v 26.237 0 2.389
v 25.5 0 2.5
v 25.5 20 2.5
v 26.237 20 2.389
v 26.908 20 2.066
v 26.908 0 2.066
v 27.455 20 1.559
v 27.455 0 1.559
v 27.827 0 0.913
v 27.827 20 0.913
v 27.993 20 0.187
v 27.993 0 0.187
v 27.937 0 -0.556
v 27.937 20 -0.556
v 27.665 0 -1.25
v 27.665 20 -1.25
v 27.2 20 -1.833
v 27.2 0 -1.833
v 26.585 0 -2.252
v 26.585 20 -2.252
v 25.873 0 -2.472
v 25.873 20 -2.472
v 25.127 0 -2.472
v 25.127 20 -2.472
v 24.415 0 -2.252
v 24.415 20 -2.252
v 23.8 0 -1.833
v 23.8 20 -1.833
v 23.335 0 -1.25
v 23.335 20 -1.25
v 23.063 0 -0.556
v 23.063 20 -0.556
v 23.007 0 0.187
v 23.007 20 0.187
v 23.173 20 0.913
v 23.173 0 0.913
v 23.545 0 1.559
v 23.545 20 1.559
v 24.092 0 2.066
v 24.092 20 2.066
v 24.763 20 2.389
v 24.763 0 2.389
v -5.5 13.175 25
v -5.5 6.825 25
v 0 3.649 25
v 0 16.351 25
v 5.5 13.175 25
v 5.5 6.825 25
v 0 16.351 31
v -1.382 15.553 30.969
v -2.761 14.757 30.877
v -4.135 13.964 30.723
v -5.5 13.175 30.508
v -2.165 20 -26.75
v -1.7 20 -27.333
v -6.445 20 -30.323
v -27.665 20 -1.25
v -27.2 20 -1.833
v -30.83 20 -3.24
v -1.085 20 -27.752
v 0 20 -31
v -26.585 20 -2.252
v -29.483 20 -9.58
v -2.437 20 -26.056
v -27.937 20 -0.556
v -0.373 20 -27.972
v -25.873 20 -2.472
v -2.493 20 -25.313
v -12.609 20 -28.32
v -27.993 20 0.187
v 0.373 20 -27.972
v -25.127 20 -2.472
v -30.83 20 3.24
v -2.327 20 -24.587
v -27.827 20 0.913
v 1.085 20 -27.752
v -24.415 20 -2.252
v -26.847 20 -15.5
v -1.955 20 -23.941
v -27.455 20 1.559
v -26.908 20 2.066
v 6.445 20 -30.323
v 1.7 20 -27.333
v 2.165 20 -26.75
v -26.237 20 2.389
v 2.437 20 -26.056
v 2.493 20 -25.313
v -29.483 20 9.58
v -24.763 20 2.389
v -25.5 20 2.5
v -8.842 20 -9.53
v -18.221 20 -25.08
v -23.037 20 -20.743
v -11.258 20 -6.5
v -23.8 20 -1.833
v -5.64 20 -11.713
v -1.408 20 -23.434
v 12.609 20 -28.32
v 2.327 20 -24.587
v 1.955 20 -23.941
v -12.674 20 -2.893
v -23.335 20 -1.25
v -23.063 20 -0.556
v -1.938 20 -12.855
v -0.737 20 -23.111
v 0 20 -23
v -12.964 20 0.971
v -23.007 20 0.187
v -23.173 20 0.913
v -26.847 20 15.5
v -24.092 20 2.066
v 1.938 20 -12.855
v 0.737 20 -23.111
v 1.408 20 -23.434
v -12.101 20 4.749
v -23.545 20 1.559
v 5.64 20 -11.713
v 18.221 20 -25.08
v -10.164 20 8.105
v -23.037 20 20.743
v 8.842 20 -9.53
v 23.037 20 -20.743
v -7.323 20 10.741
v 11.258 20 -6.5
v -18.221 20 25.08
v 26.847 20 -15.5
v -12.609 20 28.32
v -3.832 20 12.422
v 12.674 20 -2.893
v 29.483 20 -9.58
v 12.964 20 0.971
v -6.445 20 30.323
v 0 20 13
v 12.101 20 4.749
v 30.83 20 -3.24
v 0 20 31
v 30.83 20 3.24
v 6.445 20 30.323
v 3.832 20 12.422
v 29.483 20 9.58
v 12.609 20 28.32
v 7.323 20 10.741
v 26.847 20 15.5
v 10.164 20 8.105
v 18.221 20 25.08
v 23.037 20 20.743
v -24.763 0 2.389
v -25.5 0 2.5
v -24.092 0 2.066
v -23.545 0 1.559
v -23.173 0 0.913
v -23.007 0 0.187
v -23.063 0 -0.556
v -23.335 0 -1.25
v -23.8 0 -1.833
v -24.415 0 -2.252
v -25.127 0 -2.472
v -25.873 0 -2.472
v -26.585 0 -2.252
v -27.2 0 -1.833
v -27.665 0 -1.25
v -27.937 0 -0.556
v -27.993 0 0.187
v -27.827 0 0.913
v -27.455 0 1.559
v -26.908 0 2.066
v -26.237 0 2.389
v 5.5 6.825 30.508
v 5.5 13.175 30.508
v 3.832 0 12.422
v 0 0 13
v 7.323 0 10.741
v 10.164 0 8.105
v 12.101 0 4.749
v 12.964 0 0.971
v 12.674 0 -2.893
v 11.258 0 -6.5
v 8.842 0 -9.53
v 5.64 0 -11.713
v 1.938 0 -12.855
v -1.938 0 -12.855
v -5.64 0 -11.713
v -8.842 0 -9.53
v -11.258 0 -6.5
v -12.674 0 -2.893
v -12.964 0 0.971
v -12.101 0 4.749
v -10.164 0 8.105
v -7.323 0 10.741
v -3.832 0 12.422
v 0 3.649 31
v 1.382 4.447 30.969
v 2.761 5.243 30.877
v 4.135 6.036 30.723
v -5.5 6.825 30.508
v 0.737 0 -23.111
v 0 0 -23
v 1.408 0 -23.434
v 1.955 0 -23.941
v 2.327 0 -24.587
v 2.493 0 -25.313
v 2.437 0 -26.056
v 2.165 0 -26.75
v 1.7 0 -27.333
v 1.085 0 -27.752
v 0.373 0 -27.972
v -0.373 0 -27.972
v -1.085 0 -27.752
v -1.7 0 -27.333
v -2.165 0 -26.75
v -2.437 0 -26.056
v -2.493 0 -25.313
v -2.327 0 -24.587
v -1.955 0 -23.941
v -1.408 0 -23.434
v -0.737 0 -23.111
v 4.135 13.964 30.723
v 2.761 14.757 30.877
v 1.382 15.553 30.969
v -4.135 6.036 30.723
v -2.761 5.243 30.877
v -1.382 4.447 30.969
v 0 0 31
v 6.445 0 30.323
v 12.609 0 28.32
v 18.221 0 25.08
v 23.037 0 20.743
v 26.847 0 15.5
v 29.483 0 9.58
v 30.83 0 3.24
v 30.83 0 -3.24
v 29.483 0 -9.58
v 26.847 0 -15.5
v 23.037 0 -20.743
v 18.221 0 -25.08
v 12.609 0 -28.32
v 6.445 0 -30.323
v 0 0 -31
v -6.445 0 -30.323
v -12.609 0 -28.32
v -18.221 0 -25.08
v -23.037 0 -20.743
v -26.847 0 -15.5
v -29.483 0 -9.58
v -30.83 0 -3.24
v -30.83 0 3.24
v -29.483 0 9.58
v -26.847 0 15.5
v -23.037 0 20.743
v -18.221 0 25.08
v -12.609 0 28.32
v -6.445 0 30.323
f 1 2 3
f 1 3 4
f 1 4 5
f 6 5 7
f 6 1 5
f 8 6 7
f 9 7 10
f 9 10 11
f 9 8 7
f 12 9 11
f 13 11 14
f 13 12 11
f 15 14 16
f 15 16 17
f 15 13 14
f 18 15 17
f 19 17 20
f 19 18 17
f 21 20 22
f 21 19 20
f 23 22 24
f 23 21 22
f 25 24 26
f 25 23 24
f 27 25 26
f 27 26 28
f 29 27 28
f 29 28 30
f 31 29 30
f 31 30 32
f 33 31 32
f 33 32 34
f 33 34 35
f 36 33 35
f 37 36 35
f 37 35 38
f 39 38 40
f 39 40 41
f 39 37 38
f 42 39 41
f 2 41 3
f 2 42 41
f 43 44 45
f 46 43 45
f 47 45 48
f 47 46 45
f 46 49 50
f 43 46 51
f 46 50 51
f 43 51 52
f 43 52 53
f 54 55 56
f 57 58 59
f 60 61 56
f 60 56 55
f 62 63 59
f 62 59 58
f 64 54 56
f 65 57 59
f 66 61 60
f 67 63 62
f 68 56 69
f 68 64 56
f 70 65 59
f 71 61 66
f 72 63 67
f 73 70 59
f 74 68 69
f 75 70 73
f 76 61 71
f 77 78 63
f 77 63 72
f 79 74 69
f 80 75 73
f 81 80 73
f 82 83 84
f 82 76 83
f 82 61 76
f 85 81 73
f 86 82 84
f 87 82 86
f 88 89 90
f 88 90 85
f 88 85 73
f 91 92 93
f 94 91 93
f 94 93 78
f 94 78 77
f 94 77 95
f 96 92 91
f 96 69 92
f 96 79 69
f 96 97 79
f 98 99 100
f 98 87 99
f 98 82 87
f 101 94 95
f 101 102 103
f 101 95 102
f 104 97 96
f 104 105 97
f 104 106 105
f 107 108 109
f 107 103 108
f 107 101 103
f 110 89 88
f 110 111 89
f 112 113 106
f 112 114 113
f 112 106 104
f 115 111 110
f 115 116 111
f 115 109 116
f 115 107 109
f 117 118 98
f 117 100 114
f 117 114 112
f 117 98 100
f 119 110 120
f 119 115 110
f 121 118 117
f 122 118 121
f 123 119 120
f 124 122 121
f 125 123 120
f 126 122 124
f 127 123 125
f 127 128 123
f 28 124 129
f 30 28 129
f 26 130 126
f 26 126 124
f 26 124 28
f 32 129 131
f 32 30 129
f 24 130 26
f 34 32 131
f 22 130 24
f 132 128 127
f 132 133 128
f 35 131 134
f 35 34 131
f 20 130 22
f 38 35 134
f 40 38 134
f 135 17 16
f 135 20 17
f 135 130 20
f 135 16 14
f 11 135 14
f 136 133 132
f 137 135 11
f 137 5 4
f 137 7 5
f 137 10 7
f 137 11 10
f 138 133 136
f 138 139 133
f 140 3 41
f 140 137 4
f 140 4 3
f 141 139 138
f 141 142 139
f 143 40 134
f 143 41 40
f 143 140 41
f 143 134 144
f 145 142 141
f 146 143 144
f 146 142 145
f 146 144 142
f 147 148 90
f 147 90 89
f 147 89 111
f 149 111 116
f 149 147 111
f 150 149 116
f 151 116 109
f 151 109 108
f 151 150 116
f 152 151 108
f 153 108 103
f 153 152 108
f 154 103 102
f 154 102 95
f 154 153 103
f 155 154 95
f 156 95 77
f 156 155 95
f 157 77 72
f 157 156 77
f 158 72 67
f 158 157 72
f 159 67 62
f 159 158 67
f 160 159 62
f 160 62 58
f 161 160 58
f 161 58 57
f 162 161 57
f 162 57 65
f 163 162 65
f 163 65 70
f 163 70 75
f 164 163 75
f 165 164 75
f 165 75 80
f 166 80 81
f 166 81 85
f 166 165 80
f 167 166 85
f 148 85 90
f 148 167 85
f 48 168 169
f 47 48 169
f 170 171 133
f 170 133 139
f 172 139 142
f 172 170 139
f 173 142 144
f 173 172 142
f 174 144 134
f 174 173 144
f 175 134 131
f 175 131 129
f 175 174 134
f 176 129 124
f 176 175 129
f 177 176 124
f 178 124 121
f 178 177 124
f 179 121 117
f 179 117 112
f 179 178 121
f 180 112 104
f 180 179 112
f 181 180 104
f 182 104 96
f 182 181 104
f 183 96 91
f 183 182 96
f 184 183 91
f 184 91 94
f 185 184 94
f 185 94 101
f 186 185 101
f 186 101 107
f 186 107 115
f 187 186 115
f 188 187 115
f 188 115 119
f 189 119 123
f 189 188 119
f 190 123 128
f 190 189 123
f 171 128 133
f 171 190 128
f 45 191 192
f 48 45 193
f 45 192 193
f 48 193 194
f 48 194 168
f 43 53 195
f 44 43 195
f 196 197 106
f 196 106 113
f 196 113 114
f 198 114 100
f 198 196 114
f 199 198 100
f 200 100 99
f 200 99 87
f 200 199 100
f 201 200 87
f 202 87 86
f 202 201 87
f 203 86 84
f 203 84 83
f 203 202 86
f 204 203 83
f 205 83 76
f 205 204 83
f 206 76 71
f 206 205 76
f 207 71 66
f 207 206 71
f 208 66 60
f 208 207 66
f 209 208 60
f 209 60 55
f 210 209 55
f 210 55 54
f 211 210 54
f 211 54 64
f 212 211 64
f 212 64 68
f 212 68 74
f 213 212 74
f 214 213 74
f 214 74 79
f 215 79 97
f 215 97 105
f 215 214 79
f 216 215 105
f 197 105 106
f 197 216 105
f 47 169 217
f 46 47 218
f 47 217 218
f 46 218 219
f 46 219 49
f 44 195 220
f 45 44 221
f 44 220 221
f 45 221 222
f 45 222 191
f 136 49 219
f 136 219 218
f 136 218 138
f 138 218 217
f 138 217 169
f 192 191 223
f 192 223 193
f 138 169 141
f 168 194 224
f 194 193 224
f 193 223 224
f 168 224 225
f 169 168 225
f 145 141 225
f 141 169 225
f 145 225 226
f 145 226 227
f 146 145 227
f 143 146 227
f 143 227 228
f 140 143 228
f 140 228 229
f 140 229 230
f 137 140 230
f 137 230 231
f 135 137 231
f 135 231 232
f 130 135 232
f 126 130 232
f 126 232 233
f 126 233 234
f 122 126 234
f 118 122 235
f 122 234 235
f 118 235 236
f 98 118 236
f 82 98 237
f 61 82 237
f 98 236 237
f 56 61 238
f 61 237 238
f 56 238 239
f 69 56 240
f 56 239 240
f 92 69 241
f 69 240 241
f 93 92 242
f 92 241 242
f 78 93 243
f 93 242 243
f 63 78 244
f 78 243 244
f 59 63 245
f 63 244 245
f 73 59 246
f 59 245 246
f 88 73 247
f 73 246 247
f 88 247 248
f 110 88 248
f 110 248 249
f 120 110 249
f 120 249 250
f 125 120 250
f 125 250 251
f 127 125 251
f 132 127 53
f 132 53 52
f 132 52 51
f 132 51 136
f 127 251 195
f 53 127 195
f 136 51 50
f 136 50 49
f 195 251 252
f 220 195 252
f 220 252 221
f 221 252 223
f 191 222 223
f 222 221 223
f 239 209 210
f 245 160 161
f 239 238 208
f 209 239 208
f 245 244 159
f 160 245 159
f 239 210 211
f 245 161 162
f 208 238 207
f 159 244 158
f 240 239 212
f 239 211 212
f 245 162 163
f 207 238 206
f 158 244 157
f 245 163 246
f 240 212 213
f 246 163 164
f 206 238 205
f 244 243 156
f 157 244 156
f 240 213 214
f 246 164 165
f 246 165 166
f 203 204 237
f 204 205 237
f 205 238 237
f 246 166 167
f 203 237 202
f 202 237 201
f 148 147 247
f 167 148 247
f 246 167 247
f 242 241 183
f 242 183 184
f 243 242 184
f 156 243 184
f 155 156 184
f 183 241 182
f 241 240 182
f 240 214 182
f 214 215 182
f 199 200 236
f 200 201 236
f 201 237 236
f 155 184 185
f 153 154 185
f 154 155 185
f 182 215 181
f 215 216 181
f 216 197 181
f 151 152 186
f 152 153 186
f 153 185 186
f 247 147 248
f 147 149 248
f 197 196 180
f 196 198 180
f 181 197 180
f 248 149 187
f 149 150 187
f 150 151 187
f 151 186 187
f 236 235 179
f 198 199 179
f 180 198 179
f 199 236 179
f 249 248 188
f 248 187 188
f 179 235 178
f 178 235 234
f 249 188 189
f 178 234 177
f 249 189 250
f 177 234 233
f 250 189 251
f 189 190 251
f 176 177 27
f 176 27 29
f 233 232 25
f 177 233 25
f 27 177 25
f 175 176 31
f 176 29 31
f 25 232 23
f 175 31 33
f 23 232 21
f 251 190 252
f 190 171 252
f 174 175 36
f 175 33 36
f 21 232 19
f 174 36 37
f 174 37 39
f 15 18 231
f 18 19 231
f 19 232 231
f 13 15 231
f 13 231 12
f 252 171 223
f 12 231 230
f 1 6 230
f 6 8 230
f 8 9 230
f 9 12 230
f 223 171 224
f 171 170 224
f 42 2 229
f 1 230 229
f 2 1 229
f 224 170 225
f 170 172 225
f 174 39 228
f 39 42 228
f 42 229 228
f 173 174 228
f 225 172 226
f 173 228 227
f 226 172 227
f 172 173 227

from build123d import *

# Parameters (mm, degrees)
SKETCH1_R           = 31
SKETCH1_R_2         = 13
SKETCH1_R_3         = 2.5
BOSS_EXTRUDE1_DEPTH = 20
CUT_EXTRUDE1_DEPTH  = 15


with BuildPart() as part:
    # Sketch1 → Boss-Extrude1 (new body)
    with BuildSketch(Plane(origin=(0, 0, 0), x_dir=(1, 0, 0), z_dir=(0, 1, 0))):
        with Locations(Location((0, 0, 0), (0, 0, 270))):
            Circle(SKETCH1_R)
        with Locations(Location((0, 0, 0), (0, 0, 270))):
            Circle(SKETCH1_R_2, mode=Mode.SUBTRACT)
        with Locations(Location((0, 25.5, 0), (0, 0, 270))):
            Circle(SKETCH1_R_3, mode=Mode.SUBTRACT)
        with Locations(Location((-25.5, 0, 0), (0, 0, 270))):
            Circle(SKETCH1_R_3, mode=Mode.SUBTRACT)
        with Locations(Location((25.5, 0, 0), (0, 0, 270))):
            Circle(SKETCH1_R_3, mode=Mode.SUBTRACT)
    extrude(amount=BOSS_EXTRUDE1_DEPTH)

    # Sketch3 → Cut-Extrude1 (cut)
    with BuildSketch(Plane.XY.offset(40)):
        Polygon((-5.5, 6.824573519), (0, 3.649147039), (5.5, 6.824573519), (5.5, 13.175426481), (0, 16.350852961), (-5.5, 13.175426481), align=None)
    extrude(amount=-CUT_EXTRUDE1_DEPTH, mode=Mode.SUBTRACT)


solid = part.part
